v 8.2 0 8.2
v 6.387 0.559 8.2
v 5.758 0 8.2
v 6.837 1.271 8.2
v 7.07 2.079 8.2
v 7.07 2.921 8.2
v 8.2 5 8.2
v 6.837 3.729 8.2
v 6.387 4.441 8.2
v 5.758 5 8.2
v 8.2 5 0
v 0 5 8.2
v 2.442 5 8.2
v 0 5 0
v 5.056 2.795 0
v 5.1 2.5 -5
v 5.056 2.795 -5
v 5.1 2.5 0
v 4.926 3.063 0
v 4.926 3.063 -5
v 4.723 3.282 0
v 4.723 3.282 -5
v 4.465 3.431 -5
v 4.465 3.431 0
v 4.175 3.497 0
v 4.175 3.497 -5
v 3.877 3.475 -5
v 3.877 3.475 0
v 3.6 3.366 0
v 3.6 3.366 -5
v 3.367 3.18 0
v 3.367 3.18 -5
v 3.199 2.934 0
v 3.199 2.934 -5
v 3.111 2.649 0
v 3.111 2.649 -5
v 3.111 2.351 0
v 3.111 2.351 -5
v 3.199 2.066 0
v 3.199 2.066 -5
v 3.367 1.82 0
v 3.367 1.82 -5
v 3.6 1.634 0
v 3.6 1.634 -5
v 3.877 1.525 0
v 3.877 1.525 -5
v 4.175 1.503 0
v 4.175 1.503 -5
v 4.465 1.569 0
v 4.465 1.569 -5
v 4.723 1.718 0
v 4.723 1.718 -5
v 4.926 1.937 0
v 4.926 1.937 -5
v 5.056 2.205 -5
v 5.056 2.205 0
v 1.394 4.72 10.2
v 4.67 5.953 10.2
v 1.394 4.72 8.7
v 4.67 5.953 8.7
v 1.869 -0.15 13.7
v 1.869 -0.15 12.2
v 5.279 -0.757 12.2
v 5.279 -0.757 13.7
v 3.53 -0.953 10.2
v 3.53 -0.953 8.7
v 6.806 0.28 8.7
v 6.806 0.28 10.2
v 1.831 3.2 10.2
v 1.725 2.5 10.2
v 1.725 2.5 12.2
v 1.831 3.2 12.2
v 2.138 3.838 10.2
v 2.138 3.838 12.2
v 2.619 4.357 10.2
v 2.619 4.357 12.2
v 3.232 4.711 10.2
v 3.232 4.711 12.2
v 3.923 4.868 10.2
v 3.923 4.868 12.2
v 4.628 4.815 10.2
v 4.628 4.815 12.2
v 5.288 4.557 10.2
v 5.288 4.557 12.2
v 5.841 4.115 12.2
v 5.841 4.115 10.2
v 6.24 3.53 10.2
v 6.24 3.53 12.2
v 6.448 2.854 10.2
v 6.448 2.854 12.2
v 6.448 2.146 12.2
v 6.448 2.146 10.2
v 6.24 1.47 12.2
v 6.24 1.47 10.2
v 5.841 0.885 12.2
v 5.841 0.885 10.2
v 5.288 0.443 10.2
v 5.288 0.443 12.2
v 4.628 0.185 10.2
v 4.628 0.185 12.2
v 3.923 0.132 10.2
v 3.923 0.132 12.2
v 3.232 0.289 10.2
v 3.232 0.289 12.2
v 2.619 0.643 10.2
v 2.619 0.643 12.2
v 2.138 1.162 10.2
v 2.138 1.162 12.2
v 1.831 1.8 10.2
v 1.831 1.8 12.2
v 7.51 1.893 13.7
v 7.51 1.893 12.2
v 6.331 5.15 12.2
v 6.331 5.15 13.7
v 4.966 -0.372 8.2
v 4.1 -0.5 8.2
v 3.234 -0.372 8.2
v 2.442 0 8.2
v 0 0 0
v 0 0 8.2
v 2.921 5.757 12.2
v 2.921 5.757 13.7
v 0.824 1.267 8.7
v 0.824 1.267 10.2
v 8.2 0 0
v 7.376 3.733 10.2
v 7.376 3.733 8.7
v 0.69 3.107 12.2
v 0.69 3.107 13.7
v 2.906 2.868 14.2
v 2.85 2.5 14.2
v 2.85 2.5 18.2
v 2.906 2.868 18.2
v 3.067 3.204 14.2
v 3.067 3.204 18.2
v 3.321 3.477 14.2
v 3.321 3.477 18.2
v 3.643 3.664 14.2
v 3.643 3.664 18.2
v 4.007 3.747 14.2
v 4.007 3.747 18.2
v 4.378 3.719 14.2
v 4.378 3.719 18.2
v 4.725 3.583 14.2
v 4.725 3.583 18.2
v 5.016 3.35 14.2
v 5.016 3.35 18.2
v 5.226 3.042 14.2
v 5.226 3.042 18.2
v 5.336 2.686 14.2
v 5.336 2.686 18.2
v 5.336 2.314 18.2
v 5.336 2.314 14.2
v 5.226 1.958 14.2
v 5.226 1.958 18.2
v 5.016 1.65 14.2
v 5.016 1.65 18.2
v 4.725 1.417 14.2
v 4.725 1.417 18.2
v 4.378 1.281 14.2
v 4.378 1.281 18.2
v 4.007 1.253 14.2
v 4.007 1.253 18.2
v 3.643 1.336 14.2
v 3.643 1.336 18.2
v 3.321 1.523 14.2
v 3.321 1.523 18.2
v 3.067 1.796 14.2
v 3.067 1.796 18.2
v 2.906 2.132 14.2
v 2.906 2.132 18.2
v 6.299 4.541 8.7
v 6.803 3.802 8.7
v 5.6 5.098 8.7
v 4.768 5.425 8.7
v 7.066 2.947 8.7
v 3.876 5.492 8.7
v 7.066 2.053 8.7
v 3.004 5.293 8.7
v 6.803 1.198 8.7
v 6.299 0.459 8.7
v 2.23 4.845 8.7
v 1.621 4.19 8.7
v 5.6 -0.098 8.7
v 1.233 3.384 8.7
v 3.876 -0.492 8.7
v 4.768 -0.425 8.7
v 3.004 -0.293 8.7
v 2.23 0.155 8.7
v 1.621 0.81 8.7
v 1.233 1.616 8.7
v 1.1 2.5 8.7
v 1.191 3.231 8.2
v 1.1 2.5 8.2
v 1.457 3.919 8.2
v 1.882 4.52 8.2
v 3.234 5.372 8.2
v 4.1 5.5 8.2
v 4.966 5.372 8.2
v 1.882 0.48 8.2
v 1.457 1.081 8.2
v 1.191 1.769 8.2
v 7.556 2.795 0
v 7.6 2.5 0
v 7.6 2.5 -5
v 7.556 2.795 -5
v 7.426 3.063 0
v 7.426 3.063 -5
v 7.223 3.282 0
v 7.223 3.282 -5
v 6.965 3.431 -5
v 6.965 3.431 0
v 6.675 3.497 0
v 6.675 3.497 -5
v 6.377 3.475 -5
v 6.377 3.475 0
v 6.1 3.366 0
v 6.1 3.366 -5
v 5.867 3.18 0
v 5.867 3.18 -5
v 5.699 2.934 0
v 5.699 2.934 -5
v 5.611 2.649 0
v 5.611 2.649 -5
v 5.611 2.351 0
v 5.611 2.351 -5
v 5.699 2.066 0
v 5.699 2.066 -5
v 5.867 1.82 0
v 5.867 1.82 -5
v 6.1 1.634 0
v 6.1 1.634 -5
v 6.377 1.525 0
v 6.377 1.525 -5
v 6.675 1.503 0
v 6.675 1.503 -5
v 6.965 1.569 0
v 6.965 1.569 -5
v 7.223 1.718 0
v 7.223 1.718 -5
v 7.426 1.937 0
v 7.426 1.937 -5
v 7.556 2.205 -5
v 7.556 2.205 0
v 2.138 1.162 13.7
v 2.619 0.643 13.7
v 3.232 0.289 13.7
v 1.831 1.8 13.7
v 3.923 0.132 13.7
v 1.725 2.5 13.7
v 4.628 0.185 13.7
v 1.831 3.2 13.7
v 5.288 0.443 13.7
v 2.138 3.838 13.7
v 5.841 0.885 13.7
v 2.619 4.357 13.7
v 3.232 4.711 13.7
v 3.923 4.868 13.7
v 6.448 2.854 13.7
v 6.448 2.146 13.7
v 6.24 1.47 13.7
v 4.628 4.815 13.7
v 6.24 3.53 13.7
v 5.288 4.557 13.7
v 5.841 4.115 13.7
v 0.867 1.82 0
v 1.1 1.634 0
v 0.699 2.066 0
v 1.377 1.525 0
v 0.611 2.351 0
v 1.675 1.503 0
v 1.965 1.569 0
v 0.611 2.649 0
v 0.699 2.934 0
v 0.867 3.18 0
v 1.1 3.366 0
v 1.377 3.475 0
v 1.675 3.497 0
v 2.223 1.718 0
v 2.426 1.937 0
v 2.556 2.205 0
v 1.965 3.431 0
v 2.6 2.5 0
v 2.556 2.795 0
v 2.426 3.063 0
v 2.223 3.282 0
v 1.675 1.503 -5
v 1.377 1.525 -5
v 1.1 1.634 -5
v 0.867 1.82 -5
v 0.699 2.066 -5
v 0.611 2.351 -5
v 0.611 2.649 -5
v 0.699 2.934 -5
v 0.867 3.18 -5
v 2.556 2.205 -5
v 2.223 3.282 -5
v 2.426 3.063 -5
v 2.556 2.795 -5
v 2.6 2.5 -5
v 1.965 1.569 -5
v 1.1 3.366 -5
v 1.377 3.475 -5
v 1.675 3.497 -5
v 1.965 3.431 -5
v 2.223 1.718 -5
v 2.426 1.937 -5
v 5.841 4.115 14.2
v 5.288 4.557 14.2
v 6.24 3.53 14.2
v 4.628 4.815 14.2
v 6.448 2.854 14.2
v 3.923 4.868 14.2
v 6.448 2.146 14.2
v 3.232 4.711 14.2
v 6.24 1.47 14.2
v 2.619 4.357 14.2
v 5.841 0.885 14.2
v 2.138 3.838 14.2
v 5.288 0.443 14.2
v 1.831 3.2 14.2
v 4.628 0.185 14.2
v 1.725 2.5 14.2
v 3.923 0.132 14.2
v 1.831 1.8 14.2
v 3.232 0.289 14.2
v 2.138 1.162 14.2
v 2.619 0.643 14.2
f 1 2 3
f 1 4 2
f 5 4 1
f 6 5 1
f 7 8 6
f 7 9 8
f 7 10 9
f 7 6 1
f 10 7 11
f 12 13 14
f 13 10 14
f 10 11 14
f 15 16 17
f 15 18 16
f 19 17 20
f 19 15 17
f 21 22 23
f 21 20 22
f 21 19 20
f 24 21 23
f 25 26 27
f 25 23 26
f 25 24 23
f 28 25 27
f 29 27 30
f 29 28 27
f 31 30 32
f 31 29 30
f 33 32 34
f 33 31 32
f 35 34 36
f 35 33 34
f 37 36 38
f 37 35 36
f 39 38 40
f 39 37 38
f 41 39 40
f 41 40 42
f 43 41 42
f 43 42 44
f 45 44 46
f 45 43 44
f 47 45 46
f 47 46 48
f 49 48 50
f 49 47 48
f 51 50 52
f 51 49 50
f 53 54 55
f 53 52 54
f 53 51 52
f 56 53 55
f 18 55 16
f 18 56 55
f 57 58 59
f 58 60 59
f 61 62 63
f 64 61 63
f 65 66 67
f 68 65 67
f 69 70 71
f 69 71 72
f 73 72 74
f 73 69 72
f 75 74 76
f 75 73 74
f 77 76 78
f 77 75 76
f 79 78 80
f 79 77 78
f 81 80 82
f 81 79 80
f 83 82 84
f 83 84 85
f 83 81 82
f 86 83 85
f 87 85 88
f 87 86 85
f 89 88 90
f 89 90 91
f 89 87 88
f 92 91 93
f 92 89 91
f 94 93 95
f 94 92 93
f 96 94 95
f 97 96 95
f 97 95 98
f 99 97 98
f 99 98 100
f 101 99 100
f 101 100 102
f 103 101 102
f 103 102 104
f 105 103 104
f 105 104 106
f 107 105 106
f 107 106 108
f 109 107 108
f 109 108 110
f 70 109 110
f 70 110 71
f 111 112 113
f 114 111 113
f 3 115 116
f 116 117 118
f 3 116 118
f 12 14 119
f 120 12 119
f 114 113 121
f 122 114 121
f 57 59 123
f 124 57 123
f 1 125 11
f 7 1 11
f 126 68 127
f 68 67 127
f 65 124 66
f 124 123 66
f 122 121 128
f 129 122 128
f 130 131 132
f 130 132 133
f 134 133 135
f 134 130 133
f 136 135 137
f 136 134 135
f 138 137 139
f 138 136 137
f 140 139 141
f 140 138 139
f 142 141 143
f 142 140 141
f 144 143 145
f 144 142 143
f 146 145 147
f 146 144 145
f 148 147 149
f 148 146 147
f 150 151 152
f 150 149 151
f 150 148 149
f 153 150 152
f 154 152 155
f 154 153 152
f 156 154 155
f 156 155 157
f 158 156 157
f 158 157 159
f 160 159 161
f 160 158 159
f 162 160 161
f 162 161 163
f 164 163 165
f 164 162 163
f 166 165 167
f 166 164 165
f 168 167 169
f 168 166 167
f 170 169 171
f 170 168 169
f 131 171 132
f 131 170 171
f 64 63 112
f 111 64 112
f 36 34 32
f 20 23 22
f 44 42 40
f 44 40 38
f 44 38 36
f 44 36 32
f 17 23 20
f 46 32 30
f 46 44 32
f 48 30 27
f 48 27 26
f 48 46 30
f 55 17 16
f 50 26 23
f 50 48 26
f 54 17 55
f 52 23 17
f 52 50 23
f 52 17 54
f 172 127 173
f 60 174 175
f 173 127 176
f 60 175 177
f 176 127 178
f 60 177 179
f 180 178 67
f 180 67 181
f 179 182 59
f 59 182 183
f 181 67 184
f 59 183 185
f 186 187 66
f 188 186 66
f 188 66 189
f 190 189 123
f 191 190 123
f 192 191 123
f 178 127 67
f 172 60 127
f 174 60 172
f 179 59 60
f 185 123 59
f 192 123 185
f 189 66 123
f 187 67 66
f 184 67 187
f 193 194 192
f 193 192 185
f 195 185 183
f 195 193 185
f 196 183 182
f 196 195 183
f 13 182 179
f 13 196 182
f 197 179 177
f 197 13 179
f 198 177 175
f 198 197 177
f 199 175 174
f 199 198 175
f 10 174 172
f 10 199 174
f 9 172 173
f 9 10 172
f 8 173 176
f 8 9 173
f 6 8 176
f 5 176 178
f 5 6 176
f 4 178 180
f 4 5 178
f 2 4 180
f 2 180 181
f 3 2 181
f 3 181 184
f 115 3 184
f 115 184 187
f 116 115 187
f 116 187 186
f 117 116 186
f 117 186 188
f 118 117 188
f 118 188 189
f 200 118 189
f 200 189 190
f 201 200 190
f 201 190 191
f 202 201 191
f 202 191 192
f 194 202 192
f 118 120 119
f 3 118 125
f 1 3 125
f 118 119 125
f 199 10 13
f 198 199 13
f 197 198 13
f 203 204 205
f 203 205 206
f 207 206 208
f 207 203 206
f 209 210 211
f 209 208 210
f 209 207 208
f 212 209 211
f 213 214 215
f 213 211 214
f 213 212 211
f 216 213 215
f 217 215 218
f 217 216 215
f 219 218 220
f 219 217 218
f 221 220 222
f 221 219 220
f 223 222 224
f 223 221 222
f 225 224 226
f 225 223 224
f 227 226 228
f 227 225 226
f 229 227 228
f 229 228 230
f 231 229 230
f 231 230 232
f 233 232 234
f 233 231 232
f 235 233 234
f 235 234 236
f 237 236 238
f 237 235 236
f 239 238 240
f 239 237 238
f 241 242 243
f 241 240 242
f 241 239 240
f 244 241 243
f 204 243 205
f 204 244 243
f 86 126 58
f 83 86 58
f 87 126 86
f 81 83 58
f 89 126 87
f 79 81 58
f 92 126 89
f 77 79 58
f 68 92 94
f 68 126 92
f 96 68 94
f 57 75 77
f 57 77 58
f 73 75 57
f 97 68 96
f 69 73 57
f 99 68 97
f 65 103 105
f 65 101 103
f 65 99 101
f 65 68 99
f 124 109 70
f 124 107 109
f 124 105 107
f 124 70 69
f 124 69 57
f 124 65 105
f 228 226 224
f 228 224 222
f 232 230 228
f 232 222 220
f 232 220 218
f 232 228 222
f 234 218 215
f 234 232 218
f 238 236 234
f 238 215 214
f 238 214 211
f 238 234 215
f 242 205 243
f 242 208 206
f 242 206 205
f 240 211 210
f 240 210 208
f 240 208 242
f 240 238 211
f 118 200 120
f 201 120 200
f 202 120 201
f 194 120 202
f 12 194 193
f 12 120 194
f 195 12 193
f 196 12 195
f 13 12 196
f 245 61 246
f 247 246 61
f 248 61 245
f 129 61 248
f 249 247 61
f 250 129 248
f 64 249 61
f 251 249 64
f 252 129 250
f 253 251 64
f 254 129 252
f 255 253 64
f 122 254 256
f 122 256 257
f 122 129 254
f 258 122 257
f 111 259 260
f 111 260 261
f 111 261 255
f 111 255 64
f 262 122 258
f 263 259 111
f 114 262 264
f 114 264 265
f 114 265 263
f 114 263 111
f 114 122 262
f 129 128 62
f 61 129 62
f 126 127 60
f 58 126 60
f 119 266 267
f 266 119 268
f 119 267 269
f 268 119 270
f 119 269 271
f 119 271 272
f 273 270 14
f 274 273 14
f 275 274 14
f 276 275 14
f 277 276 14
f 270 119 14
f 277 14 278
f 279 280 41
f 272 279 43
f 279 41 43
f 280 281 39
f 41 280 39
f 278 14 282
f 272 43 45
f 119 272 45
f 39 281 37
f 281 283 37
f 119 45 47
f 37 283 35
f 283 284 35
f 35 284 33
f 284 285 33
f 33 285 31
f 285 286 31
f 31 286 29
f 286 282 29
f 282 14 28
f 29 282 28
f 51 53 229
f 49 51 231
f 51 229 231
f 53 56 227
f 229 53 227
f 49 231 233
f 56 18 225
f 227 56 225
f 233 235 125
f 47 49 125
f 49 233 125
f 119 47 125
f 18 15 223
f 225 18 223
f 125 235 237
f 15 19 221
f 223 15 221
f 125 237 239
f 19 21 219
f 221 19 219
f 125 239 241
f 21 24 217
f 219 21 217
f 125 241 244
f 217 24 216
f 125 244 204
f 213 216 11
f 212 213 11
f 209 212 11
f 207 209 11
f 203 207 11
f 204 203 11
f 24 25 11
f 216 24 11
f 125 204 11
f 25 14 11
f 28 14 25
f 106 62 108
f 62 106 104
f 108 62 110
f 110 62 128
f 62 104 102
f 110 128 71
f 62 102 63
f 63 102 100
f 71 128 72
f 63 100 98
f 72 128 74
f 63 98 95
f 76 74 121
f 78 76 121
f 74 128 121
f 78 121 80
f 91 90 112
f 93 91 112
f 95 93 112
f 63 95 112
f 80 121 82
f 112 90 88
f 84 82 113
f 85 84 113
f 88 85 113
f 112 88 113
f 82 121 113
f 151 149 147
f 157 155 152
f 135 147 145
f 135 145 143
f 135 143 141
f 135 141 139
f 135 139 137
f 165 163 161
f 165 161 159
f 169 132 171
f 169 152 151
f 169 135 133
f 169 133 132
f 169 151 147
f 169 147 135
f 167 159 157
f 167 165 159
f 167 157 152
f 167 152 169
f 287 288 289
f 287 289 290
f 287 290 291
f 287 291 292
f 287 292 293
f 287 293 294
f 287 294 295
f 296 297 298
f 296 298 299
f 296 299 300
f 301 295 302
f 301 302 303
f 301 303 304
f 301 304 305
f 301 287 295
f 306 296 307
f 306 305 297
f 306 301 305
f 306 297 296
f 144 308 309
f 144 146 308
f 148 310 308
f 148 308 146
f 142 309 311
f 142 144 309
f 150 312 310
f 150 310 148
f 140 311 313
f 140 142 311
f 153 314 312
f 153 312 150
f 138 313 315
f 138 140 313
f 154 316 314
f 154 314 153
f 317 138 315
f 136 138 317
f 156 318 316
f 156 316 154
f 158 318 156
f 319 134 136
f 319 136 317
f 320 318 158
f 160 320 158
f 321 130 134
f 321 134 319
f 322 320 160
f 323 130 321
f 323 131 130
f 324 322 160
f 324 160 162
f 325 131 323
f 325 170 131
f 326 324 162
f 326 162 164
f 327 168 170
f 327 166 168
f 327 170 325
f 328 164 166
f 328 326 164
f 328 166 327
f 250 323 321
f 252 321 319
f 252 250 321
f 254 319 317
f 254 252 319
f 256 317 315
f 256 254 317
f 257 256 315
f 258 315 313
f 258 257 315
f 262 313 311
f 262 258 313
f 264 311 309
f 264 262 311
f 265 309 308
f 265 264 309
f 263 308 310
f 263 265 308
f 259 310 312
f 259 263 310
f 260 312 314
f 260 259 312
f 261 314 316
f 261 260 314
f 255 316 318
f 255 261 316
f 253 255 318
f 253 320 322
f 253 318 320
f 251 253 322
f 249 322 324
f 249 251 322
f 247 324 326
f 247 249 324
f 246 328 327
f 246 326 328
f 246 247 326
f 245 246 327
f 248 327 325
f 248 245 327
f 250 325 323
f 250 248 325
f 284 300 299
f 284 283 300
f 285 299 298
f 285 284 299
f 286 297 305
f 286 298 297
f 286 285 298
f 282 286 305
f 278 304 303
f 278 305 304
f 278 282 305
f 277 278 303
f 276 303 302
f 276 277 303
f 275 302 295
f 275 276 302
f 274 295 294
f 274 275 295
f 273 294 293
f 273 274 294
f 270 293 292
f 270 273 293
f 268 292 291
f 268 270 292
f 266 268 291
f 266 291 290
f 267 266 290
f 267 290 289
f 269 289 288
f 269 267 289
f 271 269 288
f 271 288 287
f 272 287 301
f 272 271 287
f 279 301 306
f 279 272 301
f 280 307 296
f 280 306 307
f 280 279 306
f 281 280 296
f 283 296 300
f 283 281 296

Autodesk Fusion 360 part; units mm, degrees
sketch "Skizze1" plane through (0, 0, 0) normal (0, 0, 1) x (1, 0, 0)
  line L0 (0, 0) -> (8.2, 0)
  line L1 (8.2, 0) -> (8.2, 5)
  line L2 (8.2, 5) -> (0, 5)
  line L3 (0, 5) -> (0, 0)
  dimension "d1" = 8.2
  dimension "d2" = 5
extrude "Extrusion1" add sketch "Skizze1" along normal blind 8.2
sketch "Skizze2" plane through (0, 0, 8.2) normal (0, 0, 1) x (-1, 0, 0)
  line L0 (0, -5) -> (0, 0)
  line L1 (0, 0) -> (-8.2, 0)
  line L2 (-8.2, 0) -> (-8.2, -5)
  line L3 (-8.2, -5) -> (0, -5)
  circle A0 centre (-4.1, -2.5) radius 3
  dimension "d5" = 6
  dimension "d6" = 2.5
  dimension "d38" = 4.1
extrude "Extrusion2" add sketch "Skizze2" along normal blind 0.5 contours L3 A0 | L1 L3 A0 | L1 A0
sketch "Skizze3" plane through (0, 0, 8.7) normal (0, 0, 1) x (-1, 0, 0)
  circle A0 centre (-4.1, -2.5) radius 3
  circle A1 centre (-4.1, -2.5) radius 2.375
  dimension "d9" = 4.75
extrude "Extrusion3" add sketch "Skizze3" along normal blind 5.5 contours A1
sketch "Skizze4" plane through (0, 0, 14.2) normal (0, 0, 1) x (-1, 0, 0)
  circle A0 centre (-4.1, -2.5) radius 2.375
  circle A1 centre (-4.1, -2.5) radius 1.25
  dimension "d12" = 2.5
sketch "Skizze5" plane through (0, 0, 0) normal (0, 0, -1) x (1, 0, 0)
  line L0 (0, 0) -> (0, -5)
  line L1 (0, -5) -> (8.2, -5)
  line L2 (8.2, -5) -> (8.2, 0)
  line L3 (8.2, 0) -> (0, 0)
  circle A0 centre (4.1, -2.5) radius 1
  circle A1 centre (6.6, -2.5) radius 1
  circle A2 centre (1.6, -2.5) radius 1
  dimension "d17" = 2
  dimension "d18" = 2.5
  dimension "d21" = 2.5
  dimension "d22" = 0
  dimension "d25" = -2.5
  dimension "d26" = 0
  dimension "d39" = 4.1
extrude "Extrusion5" add sketch "Skizze5" along normal blind 5 contours A0 | A1 | A2
sketch "Skizze6" plane through (0, 0, 8.7) normal (0, 0, 1) x (-1, 0, 0)
  circle A0 centre (-4.1, -2.5) radius 2.375
  circle A1 centre (-4.1, -2.5) radius 3
  line L0 (-7.3757, -3.7328) -> (-4.6702, -5.9532)
  line L1 (-4.6702, -5.9532) -> (-1.3945, -4.7204)
  line L2 (-1.3945, -4.7204) -> (-0.8243, -1.2672)
  line L3 (-0.8243, -1.2672) -> (-3.5298, 0.9532)
  line L4 (-3.5298, 0.9532) -> (-6.8055, -0.2796)
  line L5 (-6.8055, -0.2796) -> (-7.3757, -3.7328)
  point P0 (-4.1, -2.5)
  dimension "d29" = 3.5
extrude "Extrusion6" add sketch "Skizze6" along normal blind 1.5 contours A1 | L0 L1 L2 L3 L4 L5
extrude "Extrusion7" add sketch "Skizze4" along normal blind 4 contours A1
ref_plane "Arbeitsebene1" through (4.1, 2.5, 12.2) normal (0, 0, 1) x (-1, 0, 0)
sketch "Skizze8" plane through (4.1, 2.5, 12.2) normal (0, 0, 1) x (1, 0, 0)
  line L0 (-1.1793, 3.2572) -> (-3.4105, 0.6073)
  line L1 (-3.4105, 0.6073) -> (-2.2311, -2.6499)
  line L2 (-2.2311, -2.6499) -> (1.1793, -3.2572)
  line L3 (1.1793, -3.2572) -> (3.4105, -0.6073)
  line L4 (3.4105, -0.6073) -> (2.2311, 2.6499)
  line L5 (2.2311, 2.6499) -> (-1.1793, 3.2572)
  dimension "d40" = 3
extrude "Extrusion9" add sketch "Skizze8" along normal blind 1.5
